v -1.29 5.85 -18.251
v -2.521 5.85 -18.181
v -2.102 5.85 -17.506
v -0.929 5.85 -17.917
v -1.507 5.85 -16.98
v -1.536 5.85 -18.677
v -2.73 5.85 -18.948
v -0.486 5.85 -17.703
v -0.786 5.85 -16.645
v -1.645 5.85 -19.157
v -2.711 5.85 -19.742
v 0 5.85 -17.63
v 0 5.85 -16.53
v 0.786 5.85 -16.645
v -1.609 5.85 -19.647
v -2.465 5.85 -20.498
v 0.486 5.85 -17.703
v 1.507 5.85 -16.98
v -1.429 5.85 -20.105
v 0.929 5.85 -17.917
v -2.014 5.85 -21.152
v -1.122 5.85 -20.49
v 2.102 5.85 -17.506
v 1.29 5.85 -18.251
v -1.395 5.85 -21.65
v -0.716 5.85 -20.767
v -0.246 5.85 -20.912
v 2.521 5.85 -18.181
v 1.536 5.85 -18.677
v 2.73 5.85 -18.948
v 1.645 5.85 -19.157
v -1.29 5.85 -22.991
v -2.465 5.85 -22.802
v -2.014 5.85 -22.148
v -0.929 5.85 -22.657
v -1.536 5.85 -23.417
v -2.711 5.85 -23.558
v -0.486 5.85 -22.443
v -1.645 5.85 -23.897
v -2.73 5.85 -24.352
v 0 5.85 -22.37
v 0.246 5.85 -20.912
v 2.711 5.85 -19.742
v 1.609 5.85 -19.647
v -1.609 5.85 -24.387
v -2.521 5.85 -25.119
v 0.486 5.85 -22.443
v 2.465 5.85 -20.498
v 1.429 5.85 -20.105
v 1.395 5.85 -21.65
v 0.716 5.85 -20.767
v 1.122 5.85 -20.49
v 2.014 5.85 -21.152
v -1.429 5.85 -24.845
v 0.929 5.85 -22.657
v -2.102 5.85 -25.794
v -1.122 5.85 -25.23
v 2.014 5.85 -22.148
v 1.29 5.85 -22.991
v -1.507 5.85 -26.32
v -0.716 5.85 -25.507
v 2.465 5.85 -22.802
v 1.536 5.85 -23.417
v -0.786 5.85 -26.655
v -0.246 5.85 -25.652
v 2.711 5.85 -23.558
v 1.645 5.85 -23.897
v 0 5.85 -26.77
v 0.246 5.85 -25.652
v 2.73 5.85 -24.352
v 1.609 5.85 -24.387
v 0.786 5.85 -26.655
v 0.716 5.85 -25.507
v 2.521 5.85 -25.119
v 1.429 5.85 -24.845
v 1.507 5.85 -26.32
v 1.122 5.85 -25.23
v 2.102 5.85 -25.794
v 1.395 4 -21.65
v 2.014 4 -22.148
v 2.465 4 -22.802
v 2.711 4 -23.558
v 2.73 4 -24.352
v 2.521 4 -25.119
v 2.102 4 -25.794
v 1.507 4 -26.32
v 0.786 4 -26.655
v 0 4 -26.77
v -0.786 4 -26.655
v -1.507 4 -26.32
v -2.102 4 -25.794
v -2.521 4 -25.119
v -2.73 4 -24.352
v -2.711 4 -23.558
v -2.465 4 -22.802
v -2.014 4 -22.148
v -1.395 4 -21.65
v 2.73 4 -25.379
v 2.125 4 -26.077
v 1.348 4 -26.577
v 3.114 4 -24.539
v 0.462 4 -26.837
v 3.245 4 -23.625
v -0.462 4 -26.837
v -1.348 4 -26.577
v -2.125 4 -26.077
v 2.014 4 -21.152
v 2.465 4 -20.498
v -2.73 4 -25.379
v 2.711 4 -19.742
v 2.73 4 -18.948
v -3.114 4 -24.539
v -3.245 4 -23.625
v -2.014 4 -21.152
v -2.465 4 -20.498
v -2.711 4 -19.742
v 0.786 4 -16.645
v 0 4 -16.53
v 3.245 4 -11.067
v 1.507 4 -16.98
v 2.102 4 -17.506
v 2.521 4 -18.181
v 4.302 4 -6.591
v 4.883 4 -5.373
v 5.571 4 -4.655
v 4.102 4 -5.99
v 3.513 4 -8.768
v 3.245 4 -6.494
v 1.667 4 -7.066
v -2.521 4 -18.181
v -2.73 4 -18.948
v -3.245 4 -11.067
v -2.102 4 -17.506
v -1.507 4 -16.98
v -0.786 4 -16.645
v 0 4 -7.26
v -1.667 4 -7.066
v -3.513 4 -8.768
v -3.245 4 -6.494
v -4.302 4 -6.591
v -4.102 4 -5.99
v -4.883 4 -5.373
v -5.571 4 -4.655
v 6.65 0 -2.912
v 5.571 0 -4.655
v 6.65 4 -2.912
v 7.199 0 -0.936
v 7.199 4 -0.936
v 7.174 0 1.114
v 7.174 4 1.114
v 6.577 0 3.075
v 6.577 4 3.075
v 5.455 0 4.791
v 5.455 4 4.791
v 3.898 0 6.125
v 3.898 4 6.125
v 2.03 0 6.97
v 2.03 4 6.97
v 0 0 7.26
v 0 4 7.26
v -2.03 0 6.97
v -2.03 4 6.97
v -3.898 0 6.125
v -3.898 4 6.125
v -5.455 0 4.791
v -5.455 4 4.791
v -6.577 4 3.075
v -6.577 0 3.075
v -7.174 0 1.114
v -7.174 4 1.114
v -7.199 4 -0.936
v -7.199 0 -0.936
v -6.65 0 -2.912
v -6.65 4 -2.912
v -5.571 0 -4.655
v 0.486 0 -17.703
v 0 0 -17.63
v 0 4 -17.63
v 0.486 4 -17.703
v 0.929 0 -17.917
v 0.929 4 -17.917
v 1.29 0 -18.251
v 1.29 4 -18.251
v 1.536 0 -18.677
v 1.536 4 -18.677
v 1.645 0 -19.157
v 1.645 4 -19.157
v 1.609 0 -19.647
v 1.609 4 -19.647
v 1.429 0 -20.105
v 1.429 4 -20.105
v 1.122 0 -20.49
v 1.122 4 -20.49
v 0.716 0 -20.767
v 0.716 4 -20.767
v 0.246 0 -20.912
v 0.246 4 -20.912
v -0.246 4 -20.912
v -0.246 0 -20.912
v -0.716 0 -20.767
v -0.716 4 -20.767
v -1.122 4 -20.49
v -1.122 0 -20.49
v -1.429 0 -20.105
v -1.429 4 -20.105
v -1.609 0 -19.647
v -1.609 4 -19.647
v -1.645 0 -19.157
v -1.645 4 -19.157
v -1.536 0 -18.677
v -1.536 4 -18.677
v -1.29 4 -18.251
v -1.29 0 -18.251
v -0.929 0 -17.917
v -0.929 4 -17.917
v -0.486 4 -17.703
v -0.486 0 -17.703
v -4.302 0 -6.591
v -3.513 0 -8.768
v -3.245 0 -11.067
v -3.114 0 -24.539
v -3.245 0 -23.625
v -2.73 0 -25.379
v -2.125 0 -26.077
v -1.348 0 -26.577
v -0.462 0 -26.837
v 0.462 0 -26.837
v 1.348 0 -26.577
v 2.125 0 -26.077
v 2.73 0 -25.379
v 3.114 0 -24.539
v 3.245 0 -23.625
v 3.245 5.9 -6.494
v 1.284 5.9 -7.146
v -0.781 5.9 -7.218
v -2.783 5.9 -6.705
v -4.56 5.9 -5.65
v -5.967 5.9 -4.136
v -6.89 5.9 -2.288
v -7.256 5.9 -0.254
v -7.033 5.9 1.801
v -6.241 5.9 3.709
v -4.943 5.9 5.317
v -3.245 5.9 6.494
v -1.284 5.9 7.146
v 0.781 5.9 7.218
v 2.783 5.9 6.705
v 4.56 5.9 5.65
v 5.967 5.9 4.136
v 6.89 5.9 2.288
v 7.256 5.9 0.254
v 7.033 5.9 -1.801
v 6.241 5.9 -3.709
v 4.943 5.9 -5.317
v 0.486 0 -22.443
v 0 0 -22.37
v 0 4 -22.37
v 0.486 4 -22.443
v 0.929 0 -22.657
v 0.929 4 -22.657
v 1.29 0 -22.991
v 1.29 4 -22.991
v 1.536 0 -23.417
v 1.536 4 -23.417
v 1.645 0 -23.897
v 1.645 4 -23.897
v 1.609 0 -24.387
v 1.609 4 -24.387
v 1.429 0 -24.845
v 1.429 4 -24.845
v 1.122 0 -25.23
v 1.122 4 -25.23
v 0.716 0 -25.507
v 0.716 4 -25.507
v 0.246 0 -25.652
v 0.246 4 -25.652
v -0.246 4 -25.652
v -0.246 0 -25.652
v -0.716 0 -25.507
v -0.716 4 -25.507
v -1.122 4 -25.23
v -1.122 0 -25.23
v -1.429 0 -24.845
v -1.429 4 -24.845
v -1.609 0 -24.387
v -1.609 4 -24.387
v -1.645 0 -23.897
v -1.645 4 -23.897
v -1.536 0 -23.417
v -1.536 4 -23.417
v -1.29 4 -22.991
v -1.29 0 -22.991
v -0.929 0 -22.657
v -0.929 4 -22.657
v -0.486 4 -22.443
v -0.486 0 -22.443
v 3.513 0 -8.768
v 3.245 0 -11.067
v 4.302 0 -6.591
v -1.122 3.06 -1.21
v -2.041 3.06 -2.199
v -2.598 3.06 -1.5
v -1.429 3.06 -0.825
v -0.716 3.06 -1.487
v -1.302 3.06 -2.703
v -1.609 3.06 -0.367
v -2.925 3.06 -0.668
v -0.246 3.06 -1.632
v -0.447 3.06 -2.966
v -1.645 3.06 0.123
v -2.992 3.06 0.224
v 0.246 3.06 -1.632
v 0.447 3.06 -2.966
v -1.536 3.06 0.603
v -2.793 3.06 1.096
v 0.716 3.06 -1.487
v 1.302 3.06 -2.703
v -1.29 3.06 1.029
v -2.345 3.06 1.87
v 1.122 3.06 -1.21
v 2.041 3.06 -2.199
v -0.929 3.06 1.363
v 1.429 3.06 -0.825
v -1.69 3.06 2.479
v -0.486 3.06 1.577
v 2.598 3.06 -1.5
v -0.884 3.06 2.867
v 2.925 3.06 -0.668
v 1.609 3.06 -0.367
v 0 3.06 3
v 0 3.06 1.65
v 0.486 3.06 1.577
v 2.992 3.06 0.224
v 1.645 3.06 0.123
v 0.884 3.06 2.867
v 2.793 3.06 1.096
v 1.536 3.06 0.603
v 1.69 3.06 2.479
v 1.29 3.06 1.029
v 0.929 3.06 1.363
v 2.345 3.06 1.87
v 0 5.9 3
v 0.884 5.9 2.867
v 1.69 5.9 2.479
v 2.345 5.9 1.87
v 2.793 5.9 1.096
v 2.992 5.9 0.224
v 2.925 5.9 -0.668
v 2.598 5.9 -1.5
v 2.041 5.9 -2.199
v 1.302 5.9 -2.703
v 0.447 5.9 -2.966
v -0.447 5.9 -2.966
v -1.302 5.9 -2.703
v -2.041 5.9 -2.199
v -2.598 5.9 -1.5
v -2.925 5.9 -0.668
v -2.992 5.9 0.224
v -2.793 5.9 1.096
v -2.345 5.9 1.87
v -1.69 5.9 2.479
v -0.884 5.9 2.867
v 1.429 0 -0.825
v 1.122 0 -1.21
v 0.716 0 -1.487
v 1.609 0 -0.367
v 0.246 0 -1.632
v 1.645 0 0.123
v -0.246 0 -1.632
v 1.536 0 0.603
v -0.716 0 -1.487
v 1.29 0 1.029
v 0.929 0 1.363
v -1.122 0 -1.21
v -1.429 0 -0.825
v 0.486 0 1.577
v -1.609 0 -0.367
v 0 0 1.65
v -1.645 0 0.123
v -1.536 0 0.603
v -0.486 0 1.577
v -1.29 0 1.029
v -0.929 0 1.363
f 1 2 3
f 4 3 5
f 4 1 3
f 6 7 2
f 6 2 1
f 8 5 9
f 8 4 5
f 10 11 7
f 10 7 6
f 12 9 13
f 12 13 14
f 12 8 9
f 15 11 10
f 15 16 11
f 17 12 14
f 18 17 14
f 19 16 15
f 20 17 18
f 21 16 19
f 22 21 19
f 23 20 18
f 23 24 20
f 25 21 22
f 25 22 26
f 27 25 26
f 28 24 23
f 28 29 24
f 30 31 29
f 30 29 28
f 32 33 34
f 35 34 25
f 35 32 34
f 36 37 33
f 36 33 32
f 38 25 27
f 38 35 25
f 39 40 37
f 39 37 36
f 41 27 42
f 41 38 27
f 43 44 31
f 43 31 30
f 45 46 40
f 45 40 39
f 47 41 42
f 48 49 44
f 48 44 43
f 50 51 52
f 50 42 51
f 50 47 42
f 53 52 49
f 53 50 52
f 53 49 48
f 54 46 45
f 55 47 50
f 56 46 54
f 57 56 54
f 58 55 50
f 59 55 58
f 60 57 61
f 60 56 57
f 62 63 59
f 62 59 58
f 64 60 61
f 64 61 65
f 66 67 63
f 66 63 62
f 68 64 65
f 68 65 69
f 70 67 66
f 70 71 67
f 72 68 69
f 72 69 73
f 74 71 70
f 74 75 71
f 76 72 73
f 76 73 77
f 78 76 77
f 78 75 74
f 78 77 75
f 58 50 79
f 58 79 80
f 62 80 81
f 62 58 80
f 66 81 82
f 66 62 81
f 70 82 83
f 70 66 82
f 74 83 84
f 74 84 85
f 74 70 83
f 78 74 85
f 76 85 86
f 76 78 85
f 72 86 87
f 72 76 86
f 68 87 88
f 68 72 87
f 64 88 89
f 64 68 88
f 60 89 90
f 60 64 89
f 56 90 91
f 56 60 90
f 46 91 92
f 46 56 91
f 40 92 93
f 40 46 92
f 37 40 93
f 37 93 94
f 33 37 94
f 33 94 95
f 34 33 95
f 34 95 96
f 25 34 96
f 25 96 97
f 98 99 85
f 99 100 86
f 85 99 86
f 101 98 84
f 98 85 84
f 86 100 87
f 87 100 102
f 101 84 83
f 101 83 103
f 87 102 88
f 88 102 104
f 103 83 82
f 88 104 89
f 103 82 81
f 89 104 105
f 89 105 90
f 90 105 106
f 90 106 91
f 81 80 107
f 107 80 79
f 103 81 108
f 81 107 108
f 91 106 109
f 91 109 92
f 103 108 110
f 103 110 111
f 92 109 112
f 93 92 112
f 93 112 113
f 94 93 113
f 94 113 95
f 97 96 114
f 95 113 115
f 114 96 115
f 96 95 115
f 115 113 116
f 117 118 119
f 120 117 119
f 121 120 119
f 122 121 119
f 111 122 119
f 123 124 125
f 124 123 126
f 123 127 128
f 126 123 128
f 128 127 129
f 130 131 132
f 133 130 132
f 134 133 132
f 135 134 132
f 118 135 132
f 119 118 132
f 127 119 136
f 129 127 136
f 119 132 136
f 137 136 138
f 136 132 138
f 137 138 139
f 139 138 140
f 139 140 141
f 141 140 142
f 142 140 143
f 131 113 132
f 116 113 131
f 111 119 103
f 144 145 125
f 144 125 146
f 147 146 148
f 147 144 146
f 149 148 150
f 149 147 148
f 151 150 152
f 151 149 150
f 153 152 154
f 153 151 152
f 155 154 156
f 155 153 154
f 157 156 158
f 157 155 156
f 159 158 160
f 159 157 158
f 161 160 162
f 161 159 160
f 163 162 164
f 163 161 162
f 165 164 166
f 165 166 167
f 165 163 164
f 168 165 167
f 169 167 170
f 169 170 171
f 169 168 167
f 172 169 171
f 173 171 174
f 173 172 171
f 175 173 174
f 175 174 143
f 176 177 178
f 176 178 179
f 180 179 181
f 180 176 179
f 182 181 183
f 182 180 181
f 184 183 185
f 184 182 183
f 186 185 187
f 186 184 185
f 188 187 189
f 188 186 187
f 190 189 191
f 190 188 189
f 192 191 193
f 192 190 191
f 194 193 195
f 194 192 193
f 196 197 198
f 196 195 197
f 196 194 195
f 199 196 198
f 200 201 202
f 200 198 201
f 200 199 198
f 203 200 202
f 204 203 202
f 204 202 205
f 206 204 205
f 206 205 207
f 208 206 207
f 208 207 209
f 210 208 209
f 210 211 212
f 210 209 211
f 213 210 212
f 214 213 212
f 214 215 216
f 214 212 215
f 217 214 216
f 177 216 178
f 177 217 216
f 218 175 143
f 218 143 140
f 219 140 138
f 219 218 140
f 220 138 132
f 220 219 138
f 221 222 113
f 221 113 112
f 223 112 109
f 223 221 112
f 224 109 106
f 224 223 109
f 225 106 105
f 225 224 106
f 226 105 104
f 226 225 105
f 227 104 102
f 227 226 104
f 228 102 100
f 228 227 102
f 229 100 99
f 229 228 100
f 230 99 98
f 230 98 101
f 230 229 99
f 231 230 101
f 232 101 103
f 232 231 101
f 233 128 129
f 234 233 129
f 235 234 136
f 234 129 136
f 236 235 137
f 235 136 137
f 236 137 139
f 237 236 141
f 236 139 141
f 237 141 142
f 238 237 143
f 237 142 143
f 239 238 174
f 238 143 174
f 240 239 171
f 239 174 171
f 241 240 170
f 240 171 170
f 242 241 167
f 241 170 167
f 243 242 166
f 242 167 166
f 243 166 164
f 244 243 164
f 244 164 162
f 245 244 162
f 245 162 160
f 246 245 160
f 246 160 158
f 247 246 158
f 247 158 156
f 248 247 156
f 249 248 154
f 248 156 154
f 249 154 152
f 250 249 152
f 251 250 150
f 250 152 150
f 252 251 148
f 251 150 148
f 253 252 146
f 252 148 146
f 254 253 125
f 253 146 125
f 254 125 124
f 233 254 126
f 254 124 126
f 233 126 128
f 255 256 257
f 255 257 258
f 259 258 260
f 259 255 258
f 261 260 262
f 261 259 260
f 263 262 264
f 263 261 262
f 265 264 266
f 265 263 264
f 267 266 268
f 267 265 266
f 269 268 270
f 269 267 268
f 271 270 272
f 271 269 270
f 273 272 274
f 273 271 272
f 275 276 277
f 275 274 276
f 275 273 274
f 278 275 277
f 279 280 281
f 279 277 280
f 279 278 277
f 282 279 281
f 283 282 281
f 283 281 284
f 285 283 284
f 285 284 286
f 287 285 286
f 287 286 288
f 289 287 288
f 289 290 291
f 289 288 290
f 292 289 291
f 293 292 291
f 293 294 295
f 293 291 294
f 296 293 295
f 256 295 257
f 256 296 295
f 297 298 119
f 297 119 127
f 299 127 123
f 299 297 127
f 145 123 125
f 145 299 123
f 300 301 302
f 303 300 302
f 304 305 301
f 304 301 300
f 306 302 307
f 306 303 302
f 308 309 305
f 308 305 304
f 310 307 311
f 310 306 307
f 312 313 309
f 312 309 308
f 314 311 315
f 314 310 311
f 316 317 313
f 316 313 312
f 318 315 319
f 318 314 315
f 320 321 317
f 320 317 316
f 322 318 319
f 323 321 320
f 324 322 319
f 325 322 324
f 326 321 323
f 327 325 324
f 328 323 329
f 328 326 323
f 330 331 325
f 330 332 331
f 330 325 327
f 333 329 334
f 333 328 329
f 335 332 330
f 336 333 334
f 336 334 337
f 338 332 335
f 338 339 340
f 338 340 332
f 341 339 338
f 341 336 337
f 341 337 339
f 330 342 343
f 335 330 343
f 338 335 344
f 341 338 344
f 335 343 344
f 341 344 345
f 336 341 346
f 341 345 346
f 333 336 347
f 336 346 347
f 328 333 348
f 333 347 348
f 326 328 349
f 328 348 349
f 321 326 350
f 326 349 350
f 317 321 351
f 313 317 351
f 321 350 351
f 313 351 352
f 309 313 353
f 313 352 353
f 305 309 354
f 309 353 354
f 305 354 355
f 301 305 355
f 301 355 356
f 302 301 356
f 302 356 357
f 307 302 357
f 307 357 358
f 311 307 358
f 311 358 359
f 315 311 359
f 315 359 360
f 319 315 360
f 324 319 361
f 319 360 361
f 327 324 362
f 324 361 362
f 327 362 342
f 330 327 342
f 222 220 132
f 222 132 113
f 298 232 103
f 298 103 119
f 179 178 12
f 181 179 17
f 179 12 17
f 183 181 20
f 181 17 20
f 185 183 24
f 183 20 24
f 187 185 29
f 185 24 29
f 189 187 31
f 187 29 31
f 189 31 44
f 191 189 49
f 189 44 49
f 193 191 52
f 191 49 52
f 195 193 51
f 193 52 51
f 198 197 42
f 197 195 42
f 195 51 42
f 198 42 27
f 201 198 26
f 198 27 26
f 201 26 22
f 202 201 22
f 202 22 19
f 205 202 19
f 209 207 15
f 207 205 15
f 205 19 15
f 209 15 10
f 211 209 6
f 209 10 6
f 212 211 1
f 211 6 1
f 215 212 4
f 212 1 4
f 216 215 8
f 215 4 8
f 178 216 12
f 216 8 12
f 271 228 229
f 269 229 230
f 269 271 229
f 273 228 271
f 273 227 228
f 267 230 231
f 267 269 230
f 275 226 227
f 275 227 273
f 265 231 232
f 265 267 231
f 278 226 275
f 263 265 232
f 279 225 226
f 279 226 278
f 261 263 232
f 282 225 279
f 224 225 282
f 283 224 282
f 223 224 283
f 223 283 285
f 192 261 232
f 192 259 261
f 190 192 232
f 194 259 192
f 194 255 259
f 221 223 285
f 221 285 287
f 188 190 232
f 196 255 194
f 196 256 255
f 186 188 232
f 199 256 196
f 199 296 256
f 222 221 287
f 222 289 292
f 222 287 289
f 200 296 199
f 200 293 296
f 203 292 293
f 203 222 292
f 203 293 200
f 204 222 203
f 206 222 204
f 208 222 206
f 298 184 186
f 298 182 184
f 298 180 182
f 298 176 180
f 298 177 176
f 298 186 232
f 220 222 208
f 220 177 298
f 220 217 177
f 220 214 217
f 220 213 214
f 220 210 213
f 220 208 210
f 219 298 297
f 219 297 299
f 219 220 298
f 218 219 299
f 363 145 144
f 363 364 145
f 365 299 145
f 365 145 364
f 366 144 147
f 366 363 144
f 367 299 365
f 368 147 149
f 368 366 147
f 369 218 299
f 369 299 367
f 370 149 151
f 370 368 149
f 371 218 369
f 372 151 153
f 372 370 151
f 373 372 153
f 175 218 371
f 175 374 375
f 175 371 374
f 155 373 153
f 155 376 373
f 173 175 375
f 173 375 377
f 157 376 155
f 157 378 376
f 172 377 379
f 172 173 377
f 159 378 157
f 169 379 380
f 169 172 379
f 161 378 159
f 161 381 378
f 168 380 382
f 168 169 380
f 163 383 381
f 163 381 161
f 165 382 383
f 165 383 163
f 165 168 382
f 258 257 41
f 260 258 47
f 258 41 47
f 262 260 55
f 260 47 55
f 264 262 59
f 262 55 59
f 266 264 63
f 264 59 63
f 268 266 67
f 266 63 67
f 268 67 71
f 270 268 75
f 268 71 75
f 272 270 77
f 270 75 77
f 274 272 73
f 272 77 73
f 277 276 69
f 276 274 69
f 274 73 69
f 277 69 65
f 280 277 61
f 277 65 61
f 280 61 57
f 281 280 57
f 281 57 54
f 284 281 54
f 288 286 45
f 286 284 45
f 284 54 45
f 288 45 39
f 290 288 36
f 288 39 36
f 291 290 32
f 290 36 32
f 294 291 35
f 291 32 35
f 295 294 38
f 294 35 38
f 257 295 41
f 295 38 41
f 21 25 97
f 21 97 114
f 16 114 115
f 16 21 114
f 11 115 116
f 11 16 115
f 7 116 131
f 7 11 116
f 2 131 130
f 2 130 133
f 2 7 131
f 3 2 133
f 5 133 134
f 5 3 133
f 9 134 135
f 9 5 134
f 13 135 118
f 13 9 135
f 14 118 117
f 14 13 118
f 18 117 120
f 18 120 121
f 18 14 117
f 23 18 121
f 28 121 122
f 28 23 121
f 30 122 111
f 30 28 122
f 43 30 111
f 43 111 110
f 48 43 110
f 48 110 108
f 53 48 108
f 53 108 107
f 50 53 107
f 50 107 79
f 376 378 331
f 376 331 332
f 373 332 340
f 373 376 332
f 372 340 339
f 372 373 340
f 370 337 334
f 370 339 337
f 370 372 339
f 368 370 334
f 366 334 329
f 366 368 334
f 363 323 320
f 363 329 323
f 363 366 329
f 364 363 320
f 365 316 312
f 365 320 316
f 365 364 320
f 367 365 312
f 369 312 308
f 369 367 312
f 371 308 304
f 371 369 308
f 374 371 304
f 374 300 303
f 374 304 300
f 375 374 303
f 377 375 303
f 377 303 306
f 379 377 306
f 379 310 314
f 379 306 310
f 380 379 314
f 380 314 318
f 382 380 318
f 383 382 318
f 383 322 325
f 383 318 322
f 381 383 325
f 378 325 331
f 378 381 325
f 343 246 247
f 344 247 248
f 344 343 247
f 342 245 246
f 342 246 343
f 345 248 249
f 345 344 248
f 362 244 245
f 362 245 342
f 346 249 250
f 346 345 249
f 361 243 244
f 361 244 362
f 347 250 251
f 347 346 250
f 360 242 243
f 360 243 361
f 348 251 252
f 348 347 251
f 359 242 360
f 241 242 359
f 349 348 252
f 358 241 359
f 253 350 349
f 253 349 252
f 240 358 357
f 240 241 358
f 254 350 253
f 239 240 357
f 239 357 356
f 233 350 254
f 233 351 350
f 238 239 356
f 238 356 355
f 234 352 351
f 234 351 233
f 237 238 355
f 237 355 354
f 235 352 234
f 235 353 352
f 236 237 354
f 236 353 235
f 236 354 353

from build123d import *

# Parameters (mm, degrees)
BOSS_EXTRU_1_DEPTH           = 4
ESQUISSE3_R                  = 7.26
BOSS_EXTRU_2_DEPTH           = 1.9
ENL_V_MAT_EXTRU_1_DEPTH      = 29.119468345
ENL_V_MAT_EXTRU_1_DEPTH_BACK = 29.119468345
ESQUISSE2_R                  = 1.65
BOSS_EXTRU_3_START           = 1.85
ESQUISSE4_R                  = 1.65
BOSS_EXTRU_3_DEPTH           = 1.85
CONG_1_R                     = 10
ESQUISSE5_R                  = 3
ENL_V_MAT_EXTRU_2_DEPTH      = 2.84


with BuildPart() as part:
    # Esquisse1 → Boss.-Extru.1 (new body)
    with BuildSketch(Plane(origin=(0, 0, 0), x_dir=(1, 0, 0), z_dir=(0, 1, 0))):
        with BuildLine():
            Line((-3.245, 6.494426457), (-3.245, 23.625))
            ThreePointArc((-3.245, 23.625), (0, 26.87), (3.245, 23.625))
            Line((3.245, 23.625), (3.245, 6.494426457))
            ThreePointArc((3.245, 6.494426457), (0, -7.26), (-3.245, 6.494426457))
        make_face()
    extrude(amount=BOSS_EXTRU_1_DEPTH)

    # Esquisse3 → Boss.-Extru.2 (add)
    with BuildSketch(Plane(origin=(0, 4, 0), x_dir=(1, 0, 0), z_dir=(0, 1, 0))):
        with Locations(Location((0, 0, 0), (0, 0, 63.450571564))):
            Circle(ESQUISSE3_R)
    extrude(amount=BOSS_EXTRU_2_DEPTH)

    # Esquisse2 → Enlèv. mat.-Extru.1 (cut, two sides: drawn at the far end of the back side and taken through both)
    with BuildSketch(Plane(origin=(0, 4, 0), x_dir=(1, 0, 0), z_dir=(0, 1, 0)).offset(-ENL_V_MAT_EXTRU_1_DEPTH_BACK)):
        with Locations(Location((0, 0, 0), (0, 0, 270))):
            Circle(ESQUISSE2_R)
        with Locations(Location((0, 19.28, 0), (0, 0, 270))):
            Circle(ESQUISSE2_R)
        with Locations(Location((0, 24.02, 0), (0, 0, 270))):
            Circle(ESQUISSE2_R)
    extrude(amount=ENL_V_MAT_EXTRU_1_DEPTH + ENL_V_MAT_EXTRU_1_DEPTH_BACK, mode=Mode.SUBTRACT)

    # Esquisse4 → Boss.-Extru.3 (add)
    with BuildSketch(Plane(origin=(0, 4, 0), x_dir=(1, 0, 0), z_dir=(0, 1, 0)).offset(BOSS_EXTRU_3_START)):
        with BuildLine():
            ThreePointArc((1.394847662, 21.65), (0, 26.77), (-1.394847662, 21.65))
            ThreePointArc((-1.394847662, 21.65), (0, 16.53), (1.394847662, 21.65))
        make_face()
        with Locations(Location((0, 24.02, 0), (0, 0, 270))):
            Circle(ESQUISSE4_R, mode=Mode.SUBTRACT)
        with Locations(Location((0, 19.28, 0), (0, 0, 270))):
            Circle(ESQUISSE4_R, mode=Mode.SUBTRACT)
    extrude(amount=-BOSS_EXTRU_3_DEPTH)

    # Congé1
    # the kernel refuses this fillet: 10 mm, written as the material it adds along each edge
    with BuildSketch(Plane(origin=(3.245, 0, -6.494426457), x_dir=(0, 0, -1), z_dir=(0, 1, 0))) as cong_1_piece_1:
        with BuildLine():
            CenterArc((4.572532249, -10), CONG_1_R, 90, 39.880695656)
            ThreePointArc((-1.839378936, -2.326187717), (-0.799649919, -1.258012346), (0, 0))
            Line((0, 0), (4.572532249, 0))
        make_face()
    extrude(amount=4)
    with BuildSketch(Plane(origin=(-3.245, 0, -6.494426457), x_dir=(0, 0, -1), z_dir=(0, 1, 0))) as cong_1_piece_2:
        with BuildLine():
            CenterArc((4.572532249, 10), CONG_1_R, 230.119304344, 39.880695656)
            ThreePointArc((-1.839378936, 2.326187717), (-0.799649919, 1.258012346), (0, 0))
            Line((0, 0), (4.572532249, 0))
        make_face()
    extrude(amount=4)

    # Esquisse5 → Enlèv. mat.-Extru.2 (cut)
    with BuildSketch(Plane(origin=(0, 5.9, 0), x_dir=(1, 0, 0), z_dir=(0, 1, 0))):
        with Locations(Location((0, 0, 0), (0, 0, 270))):
            Circle(ESQUISSE5_R)
    extrude(amount=-ENL_V_MAT_EXTRU_2_DEPTH, mode=Mode.SUBTRACT)


solid = part.part
